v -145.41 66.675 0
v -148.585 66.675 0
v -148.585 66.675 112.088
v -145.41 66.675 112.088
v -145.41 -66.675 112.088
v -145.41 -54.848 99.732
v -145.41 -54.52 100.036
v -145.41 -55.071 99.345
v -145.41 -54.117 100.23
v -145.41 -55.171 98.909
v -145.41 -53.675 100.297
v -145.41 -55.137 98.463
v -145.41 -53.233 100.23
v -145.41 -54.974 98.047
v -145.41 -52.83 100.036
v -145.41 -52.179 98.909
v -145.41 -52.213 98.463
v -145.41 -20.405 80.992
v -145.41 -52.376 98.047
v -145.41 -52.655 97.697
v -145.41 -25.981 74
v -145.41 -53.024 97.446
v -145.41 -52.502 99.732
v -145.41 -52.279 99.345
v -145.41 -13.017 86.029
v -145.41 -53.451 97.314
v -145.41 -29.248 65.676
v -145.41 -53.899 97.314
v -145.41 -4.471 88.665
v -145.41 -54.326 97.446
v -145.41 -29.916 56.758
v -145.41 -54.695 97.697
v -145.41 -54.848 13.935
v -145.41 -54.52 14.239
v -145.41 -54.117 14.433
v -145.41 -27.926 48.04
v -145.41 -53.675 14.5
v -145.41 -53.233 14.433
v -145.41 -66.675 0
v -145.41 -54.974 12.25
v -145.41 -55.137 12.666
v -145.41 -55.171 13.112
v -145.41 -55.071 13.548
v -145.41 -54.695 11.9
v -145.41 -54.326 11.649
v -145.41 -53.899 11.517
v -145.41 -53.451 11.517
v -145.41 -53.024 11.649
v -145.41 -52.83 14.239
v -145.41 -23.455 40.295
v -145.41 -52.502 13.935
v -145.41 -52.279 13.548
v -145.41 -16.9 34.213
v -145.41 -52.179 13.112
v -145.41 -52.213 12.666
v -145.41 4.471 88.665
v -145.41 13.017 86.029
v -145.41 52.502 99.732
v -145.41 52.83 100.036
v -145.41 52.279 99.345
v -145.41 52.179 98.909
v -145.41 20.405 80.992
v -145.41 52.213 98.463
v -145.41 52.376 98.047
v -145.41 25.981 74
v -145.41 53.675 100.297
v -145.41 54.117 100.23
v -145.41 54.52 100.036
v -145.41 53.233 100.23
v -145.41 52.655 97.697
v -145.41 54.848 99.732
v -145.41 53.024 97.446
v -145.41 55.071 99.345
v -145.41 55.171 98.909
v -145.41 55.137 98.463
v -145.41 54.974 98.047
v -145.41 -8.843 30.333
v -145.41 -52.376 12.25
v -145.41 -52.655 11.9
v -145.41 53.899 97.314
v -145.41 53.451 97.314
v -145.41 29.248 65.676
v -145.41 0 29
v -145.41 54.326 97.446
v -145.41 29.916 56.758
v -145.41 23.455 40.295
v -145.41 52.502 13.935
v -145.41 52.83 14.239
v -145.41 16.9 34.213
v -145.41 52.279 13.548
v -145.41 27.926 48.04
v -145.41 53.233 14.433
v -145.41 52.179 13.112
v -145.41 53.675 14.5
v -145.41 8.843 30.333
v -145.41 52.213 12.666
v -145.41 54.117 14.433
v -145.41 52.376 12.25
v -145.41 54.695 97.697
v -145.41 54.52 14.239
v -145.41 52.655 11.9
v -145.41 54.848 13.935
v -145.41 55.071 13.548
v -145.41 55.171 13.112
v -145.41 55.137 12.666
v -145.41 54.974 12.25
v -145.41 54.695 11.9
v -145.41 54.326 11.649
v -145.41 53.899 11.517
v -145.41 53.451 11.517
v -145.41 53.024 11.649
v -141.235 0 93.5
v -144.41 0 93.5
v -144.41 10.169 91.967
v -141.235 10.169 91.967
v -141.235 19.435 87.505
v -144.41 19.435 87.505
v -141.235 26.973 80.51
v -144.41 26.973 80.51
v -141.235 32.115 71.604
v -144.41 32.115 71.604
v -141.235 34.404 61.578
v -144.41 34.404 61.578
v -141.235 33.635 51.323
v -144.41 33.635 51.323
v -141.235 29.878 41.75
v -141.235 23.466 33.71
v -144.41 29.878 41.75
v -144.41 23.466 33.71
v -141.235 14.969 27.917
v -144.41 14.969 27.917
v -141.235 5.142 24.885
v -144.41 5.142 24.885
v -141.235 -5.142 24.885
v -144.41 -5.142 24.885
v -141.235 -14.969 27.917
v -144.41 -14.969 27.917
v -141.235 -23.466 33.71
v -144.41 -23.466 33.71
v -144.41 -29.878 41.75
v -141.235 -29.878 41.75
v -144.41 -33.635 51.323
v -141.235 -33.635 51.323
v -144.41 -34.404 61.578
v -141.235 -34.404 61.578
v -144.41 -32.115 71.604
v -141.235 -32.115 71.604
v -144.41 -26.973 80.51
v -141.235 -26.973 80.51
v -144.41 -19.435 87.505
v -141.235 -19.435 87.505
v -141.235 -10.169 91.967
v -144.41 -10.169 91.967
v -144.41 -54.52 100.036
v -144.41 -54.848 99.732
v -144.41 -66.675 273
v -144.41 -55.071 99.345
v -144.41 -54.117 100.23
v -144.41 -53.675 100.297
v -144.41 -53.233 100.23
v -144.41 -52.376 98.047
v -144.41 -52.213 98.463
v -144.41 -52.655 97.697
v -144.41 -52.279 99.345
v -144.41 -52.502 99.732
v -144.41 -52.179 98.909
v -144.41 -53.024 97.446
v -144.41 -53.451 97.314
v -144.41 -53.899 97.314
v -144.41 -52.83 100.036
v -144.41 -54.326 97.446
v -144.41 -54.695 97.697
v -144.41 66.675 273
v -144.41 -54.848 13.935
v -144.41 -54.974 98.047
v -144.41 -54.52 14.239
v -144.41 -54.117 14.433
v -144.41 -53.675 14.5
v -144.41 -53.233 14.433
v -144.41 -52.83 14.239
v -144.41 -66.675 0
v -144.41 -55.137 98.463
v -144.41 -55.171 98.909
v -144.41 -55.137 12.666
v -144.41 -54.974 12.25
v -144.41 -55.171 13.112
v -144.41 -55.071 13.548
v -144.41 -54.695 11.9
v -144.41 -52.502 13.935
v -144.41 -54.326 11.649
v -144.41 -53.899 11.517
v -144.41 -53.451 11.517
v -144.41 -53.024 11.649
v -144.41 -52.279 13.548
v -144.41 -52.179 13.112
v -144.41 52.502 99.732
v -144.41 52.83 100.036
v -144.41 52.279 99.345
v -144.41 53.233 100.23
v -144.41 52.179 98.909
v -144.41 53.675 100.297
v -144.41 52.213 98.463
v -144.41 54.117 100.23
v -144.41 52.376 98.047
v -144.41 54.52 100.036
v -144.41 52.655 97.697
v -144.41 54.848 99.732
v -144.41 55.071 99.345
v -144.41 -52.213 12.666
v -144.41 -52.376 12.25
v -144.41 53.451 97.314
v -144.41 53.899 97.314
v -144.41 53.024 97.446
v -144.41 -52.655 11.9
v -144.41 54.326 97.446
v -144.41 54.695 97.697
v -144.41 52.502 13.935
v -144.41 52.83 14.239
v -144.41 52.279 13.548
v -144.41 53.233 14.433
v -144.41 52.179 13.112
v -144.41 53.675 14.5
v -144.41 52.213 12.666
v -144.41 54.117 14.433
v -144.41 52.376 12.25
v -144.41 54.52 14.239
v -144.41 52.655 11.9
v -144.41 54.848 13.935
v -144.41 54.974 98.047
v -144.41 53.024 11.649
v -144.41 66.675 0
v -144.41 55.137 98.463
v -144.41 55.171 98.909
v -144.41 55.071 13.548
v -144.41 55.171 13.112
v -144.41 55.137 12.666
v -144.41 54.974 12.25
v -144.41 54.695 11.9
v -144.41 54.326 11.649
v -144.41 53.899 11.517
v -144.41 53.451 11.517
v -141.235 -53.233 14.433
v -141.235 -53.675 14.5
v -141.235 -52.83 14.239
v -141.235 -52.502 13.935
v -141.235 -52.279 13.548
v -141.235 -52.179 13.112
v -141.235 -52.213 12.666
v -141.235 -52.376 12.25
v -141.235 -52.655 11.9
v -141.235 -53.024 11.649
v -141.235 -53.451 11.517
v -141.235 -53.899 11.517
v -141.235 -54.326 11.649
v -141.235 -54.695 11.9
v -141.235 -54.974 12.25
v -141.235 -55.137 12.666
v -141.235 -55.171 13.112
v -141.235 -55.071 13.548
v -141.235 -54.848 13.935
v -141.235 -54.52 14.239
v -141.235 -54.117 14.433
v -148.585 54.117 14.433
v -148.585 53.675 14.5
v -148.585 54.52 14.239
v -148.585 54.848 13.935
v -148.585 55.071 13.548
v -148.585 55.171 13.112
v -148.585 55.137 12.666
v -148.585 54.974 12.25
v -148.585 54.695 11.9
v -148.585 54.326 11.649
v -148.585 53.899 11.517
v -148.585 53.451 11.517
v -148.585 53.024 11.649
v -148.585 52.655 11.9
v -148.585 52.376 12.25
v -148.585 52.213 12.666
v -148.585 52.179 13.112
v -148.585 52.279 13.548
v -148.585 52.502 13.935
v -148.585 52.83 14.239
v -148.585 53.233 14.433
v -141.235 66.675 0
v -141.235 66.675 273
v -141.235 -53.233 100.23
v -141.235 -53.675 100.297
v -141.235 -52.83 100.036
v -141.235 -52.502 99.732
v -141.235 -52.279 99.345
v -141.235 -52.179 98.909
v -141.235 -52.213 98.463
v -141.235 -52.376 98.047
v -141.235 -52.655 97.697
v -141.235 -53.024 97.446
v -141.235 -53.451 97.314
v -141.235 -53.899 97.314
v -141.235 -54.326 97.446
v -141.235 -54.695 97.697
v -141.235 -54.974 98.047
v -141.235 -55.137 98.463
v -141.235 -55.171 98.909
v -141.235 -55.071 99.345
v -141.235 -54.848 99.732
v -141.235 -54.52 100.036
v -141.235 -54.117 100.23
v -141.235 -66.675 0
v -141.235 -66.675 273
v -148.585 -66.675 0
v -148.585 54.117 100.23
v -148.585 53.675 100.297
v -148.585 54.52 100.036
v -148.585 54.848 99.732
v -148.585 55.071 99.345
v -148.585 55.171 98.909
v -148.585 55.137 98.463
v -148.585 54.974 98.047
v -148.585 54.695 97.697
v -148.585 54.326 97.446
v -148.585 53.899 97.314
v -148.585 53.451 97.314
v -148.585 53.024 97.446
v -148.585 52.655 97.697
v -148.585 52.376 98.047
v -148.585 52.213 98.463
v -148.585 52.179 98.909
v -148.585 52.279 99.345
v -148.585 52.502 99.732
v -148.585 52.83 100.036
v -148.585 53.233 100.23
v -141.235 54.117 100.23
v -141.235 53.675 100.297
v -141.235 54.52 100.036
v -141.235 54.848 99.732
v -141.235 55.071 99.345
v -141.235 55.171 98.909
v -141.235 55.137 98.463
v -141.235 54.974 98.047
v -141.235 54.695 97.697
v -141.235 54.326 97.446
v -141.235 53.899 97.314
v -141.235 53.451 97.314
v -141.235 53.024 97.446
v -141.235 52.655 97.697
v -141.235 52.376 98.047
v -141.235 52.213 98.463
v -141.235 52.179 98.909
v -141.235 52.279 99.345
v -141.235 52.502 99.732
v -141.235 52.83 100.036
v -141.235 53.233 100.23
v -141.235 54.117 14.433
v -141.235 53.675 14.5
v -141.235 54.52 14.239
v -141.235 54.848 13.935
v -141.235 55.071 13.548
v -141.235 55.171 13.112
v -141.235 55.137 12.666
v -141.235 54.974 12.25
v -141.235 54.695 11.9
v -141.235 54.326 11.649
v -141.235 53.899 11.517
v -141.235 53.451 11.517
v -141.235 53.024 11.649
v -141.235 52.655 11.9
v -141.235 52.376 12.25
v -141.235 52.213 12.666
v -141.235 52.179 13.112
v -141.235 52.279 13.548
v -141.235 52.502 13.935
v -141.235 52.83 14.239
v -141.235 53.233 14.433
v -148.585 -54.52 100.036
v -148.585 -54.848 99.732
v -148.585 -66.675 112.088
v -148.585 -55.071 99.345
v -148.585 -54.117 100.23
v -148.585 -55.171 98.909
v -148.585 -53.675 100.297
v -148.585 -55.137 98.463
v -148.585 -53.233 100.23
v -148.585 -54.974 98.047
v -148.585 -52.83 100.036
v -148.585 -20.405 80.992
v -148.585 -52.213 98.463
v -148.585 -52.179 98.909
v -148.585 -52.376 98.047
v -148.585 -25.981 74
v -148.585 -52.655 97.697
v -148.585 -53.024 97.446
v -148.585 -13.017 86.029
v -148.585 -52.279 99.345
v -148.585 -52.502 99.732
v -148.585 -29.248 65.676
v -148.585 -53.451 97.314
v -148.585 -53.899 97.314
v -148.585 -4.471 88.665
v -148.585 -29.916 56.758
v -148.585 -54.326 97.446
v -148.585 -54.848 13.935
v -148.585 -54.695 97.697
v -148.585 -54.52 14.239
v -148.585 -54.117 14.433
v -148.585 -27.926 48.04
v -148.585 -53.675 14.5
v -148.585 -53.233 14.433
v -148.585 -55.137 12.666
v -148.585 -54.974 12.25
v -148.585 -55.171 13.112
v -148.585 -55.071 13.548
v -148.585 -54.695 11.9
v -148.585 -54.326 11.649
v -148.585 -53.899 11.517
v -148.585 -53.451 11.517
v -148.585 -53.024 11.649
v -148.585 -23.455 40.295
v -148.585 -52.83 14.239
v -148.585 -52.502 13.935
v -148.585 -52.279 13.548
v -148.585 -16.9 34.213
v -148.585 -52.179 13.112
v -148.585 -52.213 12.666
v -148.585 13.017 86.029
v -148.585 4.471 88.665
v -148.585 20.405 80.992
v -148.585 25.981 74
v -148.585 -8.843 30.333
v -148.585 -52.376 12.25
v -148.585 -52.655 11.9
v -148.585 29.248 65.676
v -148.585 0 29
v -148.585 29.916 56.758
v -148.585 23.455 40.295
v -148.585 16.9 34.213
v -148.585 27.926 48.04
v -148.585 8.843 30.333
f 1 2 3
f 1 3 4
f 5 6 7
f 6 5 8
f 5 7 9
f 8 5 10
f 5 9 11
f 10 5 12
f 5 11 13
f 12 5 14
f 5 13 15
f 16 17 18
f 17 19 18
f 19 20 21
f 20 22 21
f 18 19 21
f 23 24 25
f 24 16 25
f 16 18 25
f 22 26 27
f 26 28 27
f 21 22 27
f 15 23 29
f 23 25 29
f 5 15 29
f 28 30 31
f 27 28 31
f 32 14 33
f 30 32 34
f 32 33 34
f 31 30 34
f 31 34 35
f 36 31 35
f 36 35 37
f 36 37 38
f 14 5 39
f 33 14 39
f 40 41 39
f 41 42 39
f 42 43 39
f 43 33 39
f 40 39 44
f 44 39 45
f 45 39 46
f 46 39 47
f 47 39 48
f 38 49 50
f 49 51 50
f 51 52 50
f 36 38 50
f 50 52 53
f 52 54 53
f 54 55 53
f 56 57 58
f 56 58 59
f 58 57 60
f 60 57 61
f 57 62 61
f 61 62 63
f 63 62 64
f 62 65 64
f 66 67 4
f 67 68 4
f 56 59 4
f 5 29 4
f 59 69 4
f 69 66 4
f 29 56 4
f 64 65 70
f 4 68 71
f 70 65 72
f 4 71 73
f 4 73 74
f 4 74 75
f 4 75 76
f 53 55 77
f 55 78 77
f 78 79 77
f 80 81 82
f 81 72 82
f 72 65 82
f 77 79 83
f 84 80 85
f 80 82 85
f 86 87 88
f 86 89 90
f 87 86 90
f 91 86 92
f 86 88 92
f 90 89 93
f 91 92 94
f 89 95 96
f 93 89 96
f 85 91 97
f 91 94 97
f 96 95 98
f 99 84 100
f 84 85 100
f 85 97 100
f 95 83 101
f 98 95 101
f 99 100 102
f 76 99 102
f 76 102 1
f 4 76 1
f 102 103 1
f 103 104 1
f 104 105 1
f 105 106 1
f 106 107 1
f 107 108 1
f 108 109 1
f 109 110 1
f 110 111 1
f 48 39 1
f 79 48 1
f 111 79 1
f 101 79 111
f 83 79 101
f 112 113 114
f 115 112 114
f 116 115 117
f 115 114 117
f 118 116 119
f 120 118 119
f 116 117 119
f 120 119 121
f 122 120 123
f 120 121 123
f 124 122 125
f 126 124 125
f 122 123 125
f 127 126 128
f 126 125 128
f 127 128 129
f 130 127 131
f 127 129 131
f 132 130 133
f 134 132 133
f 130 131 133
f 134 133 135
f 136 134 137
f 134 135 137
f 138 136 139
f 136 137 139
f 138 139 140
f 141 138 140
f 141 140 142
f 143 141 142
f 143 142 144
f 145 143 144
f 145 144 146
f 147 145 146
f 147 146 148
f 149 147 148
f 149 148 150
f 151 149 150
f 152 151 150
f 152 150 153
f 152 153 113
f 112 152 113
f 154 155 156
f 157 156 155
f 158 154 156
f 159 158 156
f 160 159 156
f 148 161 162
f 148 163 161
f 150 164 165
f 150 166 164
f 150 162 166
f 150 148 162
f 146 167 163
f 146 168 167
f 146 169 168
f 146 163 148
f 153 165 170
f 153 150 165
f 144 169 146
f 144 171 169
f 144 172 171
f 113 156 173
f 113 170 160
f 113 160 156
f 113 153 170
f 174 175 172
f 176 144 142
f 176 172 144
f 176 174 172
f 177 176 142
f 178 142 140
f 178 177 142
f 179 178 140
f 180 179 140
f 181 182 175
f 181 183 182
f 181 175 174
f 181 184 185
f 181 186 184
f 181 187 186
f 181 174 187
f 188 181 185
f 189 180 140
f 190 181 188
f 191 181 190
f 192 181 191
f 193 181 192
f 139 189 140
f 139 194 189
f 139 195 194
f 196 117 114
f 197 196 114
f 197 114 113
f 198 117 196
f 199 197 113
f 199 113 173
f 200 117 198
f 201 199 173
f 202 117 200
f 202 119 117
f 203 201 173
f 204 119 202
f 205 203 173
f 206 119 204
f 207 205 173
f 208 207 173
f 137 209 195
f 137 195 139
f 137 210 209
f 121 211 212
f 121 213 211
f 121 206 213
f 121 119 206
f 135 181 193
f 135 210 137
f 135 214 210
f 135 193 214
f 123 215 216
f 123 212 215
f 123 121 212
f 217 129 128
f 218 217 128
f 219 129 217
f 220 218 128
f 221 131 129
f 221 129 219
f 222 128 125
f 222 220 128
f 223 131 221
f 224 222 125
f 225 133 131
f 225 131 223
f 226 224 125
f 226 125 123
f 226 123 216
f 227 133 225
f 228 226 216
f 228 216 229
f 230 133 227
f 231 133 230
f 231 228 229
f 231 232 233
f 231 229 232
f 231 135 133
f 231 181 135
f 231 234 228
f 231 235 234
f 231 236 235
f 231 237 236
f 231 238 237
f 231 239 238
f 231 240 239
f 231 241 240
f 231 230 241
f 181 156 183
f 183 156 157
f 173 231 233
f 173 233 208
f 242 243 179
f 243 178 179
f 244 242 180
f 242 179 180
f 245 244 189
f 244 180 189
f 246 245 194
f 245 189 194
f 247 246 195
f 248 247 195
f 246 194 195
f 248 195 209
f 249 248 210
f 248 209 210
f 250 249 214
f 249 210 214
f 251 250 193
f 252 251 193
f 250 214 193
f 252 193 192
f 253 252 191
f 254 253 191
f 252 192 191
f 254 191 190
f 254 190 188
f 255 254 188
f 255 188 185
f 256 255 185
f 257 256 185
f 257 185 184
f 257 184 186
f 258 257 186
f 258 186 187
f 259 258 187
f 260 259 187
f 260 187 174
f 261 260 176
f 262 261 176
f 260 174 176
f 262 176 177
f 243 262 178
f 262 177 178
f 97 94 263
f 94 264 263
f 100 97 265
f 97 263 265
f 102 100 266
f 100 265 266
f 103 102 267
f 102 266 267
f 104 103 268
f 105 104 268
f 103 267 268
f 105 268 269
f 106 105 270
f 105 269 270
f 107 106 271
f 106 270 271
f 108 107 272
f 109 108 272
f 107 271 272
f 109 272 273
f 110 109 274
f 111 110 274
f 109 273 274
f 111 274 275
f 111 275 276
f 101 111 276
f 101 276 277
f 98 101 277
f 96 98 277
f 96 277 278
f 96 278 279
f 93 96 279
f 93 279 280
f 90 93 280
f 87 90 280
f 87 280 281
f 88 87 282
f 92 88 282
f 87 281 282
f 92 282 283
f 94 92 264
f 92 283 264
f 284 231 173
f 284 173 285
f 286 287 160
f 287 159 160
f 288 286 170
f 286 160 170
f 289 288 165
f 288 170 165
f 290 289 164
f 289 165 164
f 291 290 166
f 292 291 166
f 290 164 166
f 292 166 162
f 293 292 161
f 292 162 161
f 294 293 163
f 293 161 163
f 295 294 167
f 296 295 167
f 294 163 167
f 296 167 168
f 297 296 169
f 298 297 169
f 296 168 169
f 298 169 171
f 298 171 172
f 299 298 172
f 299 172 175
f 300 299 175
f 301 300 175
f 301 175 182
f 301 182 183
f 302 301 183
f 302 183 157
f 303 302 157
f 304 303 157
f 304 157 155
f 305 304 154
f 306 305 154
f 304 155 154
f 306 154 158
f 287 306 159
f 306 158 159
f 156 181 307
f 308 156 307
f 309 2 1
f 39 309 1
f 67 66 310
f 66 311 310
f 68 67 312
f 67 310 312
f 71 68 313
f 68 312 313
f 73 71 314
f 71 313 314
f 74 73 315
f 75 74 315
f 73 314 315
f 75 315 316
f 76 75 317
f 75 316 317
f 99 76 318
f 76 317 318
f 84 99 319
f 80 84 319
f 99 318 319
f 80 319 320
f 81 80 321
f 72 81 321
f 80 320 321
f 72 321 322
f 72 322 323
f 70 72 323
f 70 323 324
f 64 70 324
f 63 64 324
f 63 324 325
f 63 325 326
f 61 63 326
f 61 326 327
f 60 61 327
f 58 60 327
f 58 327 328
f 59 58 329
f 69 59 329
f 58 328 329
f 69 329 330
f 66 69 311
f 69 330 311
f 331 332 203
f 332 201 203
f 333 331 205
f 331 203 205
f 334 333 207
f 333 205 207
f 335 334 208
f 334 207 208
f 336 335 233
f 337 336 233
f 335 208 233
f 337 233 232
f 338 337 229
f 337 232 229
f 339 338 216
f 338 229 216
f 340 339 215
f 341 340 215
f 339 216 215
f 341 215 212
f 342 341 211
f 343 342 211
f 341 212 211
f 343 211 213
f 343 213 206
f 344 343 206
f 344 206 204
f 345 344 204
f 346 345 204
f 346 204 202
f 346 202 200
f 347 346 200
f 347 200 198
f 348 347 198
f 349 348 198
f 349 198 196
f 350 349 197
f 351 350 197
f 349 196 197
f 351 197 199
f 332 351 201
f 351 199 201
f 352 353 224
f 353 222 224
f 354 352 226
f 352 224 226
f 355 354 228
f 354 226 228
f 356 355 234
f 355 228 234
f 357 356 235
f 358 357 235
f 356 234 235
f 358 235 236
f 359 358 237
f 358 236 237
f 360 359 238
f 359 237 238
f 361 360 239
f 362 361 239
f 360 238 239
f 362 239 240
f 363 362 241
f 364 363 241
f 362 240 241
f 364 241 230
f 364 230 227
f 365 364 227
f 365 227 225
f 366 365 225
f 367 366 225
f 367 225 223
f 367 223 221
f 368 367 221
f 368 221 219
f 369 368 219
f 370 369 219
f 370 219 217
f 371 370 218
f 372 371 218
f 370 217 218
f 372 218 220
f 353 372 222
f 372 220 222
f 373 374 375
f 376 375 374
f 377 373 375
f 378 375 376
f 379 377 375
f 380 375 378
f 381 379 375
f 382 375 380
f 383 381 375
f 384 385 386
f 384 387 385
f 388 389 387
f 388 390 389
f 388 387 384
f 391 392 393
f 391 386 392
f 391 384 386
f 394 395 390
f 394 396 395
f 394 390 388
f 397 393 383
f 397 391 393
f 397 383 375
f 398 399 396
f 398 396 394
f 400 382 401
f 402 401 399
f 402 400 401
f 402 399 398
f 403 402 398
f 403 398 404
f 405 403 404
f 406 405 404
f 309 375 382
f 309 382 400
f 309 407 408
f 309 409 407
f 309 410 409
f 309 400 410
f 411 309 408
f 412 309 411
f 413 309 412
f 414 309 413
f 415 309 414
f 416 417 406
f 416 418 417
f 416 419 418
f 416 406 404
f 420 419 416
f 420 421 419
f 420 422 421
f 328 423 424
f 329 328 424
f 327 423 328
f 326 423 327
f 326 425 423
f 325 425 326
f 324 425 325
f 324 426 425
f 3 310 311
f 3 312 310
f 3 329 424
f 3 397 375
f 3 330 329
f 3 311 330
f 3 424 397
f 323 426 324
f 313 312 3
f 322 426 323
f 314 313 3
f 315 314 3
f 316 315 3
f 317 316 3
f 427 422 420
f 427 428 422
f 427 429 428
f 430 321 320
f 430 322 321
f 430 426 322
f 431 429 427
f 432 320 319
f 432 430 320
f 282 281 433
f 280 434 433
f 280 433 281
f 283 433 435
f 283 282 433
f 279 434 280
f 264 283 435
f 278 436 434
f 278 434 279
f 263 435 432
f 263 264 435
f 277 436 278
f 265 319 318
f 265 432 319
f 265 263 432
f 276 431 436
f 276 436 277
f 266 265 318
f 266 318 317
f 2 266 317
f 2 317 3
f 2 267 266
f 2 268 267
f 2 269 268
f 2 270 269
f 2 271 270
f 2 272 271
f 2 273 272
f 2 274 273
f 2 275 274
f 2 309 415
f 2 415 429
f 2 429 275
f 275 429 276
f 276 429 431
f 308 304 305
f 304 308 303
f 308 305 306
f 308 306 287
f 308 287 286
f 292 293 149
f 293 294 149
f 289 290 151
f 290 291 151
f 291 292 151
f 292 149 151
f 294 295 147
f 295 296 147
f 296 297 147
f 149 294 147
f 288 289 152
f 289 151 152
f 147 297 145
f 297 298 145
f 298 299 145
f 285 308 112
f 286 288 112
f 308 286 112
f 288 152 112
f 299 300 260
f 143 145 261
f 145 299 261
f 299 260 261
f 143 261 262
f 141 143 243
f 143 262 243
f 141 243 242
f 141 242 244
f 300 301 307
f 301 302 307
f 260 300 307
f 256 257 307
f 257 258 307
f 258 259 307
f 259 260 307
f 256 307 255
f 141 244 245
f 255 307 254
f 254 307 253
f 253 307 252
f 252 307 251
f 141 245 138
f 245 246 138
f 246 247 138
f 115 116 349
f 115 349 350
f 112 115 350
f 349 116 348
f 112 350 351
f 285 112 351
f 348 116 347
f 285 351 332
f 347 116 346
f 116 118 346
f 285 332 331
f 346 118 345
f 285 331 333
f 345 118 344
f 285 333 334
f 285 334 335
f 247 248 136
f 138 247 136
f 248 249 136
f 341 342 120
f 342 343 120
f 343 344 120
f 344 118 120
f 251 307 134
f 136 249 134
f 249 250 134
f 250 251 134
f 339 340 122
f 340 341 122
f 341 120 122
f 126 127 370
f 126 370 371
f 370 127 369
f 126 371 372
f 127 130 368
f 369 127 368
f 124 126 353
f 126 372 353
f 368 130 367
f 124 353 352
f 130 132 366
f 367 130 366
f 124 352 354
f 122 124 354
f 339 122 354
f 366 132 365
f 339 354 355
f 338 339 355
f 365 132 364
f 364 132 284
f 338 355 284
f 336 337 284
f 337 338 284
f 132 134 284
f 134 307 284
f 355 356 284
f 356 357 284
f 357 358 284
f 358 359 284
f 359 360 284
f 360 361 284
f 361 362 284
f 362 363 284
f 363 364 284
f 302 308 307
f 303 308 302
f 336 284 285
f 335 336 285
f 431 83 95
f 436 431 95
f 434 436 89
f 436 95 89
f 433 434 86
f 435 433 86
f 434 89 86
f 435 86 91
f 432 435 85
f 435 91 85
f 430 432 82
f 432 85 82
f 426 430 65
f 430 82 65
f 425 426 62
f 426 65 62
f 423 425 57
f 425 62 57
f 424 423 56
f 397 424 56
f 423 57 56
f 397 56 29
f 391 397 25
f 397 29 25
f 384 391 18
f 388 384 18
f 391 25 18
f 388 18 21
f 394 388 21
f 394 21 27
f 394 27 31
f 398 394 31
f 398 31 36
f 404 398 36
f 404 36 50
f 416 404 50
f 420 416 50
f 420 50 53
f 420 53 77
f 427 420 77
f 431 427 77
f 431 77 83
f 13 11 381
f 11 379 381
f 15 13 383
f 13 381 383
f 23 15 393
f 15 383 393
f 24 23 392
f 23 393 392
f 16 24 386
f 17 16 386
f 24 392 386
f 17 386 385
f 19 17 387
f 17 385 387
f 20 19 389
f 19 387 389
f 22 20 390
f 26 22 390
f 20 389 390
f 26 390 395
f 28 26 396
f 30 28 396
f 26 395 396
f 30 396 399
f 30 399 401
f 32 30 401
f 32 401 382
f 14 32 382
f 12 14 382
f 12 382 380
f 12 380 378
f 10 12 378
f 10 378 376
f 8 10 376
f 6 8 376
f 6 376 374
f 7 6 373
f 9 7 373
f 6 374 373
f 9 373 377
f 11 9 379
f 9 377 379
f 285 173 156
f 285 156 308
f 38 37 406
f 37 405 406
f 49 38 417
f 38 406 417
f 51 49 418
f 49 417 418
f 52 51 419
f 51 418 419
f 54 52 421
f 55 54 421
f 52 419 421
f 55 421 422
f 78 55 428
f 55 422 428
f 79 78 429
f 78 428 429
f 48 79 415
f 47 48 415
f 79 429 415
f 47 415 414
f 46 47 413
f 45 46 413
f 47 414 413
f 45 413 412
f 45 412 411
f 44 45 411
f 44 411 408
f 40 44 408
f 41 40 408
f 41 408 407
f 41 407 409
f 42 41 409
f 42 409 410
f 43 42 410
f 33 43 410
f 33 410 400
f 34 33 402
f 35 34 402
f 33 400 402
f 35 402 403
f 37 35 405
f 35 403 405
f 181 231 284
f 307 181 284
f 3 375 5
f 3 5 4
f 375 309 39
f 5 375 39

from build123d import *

# Parameters (mm, degrees)
SKETCH1_W               = 3.175
SKETCH1_H               = 133.35
BOSS_EXTRUDE1_DEPTH     = 273
BOSS_EXTRUDE1_2_DEPTH   = 273
SKETCH3_R               = 30
CUT_EXTRUDE2_DEPTH      = 295
SKETCH2_R               = 34.5
CUT_EXTRUDE3_DEPTH      = 100
CUT_EXTRUDE3_DEPTH_BACK = 13
SKETCH4_R               = 1.5
CUT_EXTRUDE4_DEPTH      = 3
CUT_EXTRUDE4_DEPTH_BACK = 63
SKETCH5_W               = 164.64534511
SKETCH5_H               = 137.520906048
CUT_EXTRUDE5_DEPTH      = 11
CUT_EXTRUDE5_DEPTH_BACK = 4


with BuildPart() as part:
    # Sketch1 → Boss-Extrude1 (new body)
    with BuildSketch(Plane.XY):
        with Locations((-142.822089486, 0)):
            Rectangle(SKETCH1_W, SKETCH1_H)
    extrude(amount=BOSS_EXTRUDE1_DEPTH)

    # Sketch2 → Cut-Extrude3 (cut, two sides)
    with BuildSketch(Plane.ZY.offset(144.409589486)) as cut_extrude3_sk:
        with Locations((59, 0)):
            Circle(SKETCH2_R)
    extrude(amount=CUT_EXTRUDE3_DEPTH, mode=Mode.SUBTRACT)
    extrude(cut_extrude3_sk.sketch, amount=-CUT_EXTRUDE3_DEPTH_BACK, mode=Mode.SUBTRACT)


with BuildPart() as body_2:
    # Sketch1 → Boss-Extrude1 2 (new body)
    with BuildSketch(Plane.XY):
        with Locations((-146.997089486, 0)):
            Rectangle(SKETCH1_W, SKETCH1_H)
    extrude(amount=BOSS_EXTRUDE1_2_DEPTH)

    # Sketch3 → Cut-Extrude2 (cut)
    with BuildSketch(Plane(origin=(-145.409589486, 0, 0), x_dir=(0, 0, -1), z_dir=(1, 0, 0))):
        with Locations((-59, 0)):
            Circle(SKETCH3_R)
    extrude(amount=-CUT_EXTRUDE2_DEPTH, mode=Mode.SUBTRACT)


with BuildPart() as cut_extrude4_tool:
    # Sketch4 → Cut-Extrude4 (new body, two sides)
    with BuildSketch(Plane.ZY.offset(148.584589486)) as cut_extrude4_sk:
        with Locations((13, -53.675)):
            Circle(SKETCH4_R)
        with Locations((13, 53.675)):
            Circle(SKETCH4_R)
        with Locations((98.797029703, -53.675)):
            Circle(SKETCH4_R)
        with Locations((98.797029703, 53.675)):
            Circle(SKETCH4_R)
    extrude(amount=CUT_EXTRUDE4_DEPTH)
    extrude(cut_extrude4_sk.sketch, amount=-CUT_EXTRUDE4_DEPTH_BACK)


with BuildPart() as part_1:
    add(part.part)

    # Cut-Extrude4: cut by cut_extrude4_tool
    add(cut_extrude4_tool.part, mode=Mode.SUBTRACT)


with BuildPart() as body_2_1:
    add(body_2.part)

    # Cut-Extrude4: cut by cut_extrude4_tool
    add(cut_extrude4_tool.part, mode=Mode.SUBTRACT)

    # Sketch5 → Cut-Extrude5 (cut, two sides)
    with BuildSketch(Plane.ZY.offset(148.584589486)) as cut_extrude5_sk:
        with Locations((194.410677399, -0.406866586)):
            Rectangle(SKETCH5_W, SKETCH5_H)
    extrude(amount=CUT_EXTRUDE5_DEPTH, mode=Mode.SUBTRACT)
    extrude(cut_extrude5_sk.sketch, amount=-CUT_EXTRUDE5_DEPTH_BACK, mode=Mode.SUBTRACT)


solid = Compound([part_1.part, body_2_1.part])
